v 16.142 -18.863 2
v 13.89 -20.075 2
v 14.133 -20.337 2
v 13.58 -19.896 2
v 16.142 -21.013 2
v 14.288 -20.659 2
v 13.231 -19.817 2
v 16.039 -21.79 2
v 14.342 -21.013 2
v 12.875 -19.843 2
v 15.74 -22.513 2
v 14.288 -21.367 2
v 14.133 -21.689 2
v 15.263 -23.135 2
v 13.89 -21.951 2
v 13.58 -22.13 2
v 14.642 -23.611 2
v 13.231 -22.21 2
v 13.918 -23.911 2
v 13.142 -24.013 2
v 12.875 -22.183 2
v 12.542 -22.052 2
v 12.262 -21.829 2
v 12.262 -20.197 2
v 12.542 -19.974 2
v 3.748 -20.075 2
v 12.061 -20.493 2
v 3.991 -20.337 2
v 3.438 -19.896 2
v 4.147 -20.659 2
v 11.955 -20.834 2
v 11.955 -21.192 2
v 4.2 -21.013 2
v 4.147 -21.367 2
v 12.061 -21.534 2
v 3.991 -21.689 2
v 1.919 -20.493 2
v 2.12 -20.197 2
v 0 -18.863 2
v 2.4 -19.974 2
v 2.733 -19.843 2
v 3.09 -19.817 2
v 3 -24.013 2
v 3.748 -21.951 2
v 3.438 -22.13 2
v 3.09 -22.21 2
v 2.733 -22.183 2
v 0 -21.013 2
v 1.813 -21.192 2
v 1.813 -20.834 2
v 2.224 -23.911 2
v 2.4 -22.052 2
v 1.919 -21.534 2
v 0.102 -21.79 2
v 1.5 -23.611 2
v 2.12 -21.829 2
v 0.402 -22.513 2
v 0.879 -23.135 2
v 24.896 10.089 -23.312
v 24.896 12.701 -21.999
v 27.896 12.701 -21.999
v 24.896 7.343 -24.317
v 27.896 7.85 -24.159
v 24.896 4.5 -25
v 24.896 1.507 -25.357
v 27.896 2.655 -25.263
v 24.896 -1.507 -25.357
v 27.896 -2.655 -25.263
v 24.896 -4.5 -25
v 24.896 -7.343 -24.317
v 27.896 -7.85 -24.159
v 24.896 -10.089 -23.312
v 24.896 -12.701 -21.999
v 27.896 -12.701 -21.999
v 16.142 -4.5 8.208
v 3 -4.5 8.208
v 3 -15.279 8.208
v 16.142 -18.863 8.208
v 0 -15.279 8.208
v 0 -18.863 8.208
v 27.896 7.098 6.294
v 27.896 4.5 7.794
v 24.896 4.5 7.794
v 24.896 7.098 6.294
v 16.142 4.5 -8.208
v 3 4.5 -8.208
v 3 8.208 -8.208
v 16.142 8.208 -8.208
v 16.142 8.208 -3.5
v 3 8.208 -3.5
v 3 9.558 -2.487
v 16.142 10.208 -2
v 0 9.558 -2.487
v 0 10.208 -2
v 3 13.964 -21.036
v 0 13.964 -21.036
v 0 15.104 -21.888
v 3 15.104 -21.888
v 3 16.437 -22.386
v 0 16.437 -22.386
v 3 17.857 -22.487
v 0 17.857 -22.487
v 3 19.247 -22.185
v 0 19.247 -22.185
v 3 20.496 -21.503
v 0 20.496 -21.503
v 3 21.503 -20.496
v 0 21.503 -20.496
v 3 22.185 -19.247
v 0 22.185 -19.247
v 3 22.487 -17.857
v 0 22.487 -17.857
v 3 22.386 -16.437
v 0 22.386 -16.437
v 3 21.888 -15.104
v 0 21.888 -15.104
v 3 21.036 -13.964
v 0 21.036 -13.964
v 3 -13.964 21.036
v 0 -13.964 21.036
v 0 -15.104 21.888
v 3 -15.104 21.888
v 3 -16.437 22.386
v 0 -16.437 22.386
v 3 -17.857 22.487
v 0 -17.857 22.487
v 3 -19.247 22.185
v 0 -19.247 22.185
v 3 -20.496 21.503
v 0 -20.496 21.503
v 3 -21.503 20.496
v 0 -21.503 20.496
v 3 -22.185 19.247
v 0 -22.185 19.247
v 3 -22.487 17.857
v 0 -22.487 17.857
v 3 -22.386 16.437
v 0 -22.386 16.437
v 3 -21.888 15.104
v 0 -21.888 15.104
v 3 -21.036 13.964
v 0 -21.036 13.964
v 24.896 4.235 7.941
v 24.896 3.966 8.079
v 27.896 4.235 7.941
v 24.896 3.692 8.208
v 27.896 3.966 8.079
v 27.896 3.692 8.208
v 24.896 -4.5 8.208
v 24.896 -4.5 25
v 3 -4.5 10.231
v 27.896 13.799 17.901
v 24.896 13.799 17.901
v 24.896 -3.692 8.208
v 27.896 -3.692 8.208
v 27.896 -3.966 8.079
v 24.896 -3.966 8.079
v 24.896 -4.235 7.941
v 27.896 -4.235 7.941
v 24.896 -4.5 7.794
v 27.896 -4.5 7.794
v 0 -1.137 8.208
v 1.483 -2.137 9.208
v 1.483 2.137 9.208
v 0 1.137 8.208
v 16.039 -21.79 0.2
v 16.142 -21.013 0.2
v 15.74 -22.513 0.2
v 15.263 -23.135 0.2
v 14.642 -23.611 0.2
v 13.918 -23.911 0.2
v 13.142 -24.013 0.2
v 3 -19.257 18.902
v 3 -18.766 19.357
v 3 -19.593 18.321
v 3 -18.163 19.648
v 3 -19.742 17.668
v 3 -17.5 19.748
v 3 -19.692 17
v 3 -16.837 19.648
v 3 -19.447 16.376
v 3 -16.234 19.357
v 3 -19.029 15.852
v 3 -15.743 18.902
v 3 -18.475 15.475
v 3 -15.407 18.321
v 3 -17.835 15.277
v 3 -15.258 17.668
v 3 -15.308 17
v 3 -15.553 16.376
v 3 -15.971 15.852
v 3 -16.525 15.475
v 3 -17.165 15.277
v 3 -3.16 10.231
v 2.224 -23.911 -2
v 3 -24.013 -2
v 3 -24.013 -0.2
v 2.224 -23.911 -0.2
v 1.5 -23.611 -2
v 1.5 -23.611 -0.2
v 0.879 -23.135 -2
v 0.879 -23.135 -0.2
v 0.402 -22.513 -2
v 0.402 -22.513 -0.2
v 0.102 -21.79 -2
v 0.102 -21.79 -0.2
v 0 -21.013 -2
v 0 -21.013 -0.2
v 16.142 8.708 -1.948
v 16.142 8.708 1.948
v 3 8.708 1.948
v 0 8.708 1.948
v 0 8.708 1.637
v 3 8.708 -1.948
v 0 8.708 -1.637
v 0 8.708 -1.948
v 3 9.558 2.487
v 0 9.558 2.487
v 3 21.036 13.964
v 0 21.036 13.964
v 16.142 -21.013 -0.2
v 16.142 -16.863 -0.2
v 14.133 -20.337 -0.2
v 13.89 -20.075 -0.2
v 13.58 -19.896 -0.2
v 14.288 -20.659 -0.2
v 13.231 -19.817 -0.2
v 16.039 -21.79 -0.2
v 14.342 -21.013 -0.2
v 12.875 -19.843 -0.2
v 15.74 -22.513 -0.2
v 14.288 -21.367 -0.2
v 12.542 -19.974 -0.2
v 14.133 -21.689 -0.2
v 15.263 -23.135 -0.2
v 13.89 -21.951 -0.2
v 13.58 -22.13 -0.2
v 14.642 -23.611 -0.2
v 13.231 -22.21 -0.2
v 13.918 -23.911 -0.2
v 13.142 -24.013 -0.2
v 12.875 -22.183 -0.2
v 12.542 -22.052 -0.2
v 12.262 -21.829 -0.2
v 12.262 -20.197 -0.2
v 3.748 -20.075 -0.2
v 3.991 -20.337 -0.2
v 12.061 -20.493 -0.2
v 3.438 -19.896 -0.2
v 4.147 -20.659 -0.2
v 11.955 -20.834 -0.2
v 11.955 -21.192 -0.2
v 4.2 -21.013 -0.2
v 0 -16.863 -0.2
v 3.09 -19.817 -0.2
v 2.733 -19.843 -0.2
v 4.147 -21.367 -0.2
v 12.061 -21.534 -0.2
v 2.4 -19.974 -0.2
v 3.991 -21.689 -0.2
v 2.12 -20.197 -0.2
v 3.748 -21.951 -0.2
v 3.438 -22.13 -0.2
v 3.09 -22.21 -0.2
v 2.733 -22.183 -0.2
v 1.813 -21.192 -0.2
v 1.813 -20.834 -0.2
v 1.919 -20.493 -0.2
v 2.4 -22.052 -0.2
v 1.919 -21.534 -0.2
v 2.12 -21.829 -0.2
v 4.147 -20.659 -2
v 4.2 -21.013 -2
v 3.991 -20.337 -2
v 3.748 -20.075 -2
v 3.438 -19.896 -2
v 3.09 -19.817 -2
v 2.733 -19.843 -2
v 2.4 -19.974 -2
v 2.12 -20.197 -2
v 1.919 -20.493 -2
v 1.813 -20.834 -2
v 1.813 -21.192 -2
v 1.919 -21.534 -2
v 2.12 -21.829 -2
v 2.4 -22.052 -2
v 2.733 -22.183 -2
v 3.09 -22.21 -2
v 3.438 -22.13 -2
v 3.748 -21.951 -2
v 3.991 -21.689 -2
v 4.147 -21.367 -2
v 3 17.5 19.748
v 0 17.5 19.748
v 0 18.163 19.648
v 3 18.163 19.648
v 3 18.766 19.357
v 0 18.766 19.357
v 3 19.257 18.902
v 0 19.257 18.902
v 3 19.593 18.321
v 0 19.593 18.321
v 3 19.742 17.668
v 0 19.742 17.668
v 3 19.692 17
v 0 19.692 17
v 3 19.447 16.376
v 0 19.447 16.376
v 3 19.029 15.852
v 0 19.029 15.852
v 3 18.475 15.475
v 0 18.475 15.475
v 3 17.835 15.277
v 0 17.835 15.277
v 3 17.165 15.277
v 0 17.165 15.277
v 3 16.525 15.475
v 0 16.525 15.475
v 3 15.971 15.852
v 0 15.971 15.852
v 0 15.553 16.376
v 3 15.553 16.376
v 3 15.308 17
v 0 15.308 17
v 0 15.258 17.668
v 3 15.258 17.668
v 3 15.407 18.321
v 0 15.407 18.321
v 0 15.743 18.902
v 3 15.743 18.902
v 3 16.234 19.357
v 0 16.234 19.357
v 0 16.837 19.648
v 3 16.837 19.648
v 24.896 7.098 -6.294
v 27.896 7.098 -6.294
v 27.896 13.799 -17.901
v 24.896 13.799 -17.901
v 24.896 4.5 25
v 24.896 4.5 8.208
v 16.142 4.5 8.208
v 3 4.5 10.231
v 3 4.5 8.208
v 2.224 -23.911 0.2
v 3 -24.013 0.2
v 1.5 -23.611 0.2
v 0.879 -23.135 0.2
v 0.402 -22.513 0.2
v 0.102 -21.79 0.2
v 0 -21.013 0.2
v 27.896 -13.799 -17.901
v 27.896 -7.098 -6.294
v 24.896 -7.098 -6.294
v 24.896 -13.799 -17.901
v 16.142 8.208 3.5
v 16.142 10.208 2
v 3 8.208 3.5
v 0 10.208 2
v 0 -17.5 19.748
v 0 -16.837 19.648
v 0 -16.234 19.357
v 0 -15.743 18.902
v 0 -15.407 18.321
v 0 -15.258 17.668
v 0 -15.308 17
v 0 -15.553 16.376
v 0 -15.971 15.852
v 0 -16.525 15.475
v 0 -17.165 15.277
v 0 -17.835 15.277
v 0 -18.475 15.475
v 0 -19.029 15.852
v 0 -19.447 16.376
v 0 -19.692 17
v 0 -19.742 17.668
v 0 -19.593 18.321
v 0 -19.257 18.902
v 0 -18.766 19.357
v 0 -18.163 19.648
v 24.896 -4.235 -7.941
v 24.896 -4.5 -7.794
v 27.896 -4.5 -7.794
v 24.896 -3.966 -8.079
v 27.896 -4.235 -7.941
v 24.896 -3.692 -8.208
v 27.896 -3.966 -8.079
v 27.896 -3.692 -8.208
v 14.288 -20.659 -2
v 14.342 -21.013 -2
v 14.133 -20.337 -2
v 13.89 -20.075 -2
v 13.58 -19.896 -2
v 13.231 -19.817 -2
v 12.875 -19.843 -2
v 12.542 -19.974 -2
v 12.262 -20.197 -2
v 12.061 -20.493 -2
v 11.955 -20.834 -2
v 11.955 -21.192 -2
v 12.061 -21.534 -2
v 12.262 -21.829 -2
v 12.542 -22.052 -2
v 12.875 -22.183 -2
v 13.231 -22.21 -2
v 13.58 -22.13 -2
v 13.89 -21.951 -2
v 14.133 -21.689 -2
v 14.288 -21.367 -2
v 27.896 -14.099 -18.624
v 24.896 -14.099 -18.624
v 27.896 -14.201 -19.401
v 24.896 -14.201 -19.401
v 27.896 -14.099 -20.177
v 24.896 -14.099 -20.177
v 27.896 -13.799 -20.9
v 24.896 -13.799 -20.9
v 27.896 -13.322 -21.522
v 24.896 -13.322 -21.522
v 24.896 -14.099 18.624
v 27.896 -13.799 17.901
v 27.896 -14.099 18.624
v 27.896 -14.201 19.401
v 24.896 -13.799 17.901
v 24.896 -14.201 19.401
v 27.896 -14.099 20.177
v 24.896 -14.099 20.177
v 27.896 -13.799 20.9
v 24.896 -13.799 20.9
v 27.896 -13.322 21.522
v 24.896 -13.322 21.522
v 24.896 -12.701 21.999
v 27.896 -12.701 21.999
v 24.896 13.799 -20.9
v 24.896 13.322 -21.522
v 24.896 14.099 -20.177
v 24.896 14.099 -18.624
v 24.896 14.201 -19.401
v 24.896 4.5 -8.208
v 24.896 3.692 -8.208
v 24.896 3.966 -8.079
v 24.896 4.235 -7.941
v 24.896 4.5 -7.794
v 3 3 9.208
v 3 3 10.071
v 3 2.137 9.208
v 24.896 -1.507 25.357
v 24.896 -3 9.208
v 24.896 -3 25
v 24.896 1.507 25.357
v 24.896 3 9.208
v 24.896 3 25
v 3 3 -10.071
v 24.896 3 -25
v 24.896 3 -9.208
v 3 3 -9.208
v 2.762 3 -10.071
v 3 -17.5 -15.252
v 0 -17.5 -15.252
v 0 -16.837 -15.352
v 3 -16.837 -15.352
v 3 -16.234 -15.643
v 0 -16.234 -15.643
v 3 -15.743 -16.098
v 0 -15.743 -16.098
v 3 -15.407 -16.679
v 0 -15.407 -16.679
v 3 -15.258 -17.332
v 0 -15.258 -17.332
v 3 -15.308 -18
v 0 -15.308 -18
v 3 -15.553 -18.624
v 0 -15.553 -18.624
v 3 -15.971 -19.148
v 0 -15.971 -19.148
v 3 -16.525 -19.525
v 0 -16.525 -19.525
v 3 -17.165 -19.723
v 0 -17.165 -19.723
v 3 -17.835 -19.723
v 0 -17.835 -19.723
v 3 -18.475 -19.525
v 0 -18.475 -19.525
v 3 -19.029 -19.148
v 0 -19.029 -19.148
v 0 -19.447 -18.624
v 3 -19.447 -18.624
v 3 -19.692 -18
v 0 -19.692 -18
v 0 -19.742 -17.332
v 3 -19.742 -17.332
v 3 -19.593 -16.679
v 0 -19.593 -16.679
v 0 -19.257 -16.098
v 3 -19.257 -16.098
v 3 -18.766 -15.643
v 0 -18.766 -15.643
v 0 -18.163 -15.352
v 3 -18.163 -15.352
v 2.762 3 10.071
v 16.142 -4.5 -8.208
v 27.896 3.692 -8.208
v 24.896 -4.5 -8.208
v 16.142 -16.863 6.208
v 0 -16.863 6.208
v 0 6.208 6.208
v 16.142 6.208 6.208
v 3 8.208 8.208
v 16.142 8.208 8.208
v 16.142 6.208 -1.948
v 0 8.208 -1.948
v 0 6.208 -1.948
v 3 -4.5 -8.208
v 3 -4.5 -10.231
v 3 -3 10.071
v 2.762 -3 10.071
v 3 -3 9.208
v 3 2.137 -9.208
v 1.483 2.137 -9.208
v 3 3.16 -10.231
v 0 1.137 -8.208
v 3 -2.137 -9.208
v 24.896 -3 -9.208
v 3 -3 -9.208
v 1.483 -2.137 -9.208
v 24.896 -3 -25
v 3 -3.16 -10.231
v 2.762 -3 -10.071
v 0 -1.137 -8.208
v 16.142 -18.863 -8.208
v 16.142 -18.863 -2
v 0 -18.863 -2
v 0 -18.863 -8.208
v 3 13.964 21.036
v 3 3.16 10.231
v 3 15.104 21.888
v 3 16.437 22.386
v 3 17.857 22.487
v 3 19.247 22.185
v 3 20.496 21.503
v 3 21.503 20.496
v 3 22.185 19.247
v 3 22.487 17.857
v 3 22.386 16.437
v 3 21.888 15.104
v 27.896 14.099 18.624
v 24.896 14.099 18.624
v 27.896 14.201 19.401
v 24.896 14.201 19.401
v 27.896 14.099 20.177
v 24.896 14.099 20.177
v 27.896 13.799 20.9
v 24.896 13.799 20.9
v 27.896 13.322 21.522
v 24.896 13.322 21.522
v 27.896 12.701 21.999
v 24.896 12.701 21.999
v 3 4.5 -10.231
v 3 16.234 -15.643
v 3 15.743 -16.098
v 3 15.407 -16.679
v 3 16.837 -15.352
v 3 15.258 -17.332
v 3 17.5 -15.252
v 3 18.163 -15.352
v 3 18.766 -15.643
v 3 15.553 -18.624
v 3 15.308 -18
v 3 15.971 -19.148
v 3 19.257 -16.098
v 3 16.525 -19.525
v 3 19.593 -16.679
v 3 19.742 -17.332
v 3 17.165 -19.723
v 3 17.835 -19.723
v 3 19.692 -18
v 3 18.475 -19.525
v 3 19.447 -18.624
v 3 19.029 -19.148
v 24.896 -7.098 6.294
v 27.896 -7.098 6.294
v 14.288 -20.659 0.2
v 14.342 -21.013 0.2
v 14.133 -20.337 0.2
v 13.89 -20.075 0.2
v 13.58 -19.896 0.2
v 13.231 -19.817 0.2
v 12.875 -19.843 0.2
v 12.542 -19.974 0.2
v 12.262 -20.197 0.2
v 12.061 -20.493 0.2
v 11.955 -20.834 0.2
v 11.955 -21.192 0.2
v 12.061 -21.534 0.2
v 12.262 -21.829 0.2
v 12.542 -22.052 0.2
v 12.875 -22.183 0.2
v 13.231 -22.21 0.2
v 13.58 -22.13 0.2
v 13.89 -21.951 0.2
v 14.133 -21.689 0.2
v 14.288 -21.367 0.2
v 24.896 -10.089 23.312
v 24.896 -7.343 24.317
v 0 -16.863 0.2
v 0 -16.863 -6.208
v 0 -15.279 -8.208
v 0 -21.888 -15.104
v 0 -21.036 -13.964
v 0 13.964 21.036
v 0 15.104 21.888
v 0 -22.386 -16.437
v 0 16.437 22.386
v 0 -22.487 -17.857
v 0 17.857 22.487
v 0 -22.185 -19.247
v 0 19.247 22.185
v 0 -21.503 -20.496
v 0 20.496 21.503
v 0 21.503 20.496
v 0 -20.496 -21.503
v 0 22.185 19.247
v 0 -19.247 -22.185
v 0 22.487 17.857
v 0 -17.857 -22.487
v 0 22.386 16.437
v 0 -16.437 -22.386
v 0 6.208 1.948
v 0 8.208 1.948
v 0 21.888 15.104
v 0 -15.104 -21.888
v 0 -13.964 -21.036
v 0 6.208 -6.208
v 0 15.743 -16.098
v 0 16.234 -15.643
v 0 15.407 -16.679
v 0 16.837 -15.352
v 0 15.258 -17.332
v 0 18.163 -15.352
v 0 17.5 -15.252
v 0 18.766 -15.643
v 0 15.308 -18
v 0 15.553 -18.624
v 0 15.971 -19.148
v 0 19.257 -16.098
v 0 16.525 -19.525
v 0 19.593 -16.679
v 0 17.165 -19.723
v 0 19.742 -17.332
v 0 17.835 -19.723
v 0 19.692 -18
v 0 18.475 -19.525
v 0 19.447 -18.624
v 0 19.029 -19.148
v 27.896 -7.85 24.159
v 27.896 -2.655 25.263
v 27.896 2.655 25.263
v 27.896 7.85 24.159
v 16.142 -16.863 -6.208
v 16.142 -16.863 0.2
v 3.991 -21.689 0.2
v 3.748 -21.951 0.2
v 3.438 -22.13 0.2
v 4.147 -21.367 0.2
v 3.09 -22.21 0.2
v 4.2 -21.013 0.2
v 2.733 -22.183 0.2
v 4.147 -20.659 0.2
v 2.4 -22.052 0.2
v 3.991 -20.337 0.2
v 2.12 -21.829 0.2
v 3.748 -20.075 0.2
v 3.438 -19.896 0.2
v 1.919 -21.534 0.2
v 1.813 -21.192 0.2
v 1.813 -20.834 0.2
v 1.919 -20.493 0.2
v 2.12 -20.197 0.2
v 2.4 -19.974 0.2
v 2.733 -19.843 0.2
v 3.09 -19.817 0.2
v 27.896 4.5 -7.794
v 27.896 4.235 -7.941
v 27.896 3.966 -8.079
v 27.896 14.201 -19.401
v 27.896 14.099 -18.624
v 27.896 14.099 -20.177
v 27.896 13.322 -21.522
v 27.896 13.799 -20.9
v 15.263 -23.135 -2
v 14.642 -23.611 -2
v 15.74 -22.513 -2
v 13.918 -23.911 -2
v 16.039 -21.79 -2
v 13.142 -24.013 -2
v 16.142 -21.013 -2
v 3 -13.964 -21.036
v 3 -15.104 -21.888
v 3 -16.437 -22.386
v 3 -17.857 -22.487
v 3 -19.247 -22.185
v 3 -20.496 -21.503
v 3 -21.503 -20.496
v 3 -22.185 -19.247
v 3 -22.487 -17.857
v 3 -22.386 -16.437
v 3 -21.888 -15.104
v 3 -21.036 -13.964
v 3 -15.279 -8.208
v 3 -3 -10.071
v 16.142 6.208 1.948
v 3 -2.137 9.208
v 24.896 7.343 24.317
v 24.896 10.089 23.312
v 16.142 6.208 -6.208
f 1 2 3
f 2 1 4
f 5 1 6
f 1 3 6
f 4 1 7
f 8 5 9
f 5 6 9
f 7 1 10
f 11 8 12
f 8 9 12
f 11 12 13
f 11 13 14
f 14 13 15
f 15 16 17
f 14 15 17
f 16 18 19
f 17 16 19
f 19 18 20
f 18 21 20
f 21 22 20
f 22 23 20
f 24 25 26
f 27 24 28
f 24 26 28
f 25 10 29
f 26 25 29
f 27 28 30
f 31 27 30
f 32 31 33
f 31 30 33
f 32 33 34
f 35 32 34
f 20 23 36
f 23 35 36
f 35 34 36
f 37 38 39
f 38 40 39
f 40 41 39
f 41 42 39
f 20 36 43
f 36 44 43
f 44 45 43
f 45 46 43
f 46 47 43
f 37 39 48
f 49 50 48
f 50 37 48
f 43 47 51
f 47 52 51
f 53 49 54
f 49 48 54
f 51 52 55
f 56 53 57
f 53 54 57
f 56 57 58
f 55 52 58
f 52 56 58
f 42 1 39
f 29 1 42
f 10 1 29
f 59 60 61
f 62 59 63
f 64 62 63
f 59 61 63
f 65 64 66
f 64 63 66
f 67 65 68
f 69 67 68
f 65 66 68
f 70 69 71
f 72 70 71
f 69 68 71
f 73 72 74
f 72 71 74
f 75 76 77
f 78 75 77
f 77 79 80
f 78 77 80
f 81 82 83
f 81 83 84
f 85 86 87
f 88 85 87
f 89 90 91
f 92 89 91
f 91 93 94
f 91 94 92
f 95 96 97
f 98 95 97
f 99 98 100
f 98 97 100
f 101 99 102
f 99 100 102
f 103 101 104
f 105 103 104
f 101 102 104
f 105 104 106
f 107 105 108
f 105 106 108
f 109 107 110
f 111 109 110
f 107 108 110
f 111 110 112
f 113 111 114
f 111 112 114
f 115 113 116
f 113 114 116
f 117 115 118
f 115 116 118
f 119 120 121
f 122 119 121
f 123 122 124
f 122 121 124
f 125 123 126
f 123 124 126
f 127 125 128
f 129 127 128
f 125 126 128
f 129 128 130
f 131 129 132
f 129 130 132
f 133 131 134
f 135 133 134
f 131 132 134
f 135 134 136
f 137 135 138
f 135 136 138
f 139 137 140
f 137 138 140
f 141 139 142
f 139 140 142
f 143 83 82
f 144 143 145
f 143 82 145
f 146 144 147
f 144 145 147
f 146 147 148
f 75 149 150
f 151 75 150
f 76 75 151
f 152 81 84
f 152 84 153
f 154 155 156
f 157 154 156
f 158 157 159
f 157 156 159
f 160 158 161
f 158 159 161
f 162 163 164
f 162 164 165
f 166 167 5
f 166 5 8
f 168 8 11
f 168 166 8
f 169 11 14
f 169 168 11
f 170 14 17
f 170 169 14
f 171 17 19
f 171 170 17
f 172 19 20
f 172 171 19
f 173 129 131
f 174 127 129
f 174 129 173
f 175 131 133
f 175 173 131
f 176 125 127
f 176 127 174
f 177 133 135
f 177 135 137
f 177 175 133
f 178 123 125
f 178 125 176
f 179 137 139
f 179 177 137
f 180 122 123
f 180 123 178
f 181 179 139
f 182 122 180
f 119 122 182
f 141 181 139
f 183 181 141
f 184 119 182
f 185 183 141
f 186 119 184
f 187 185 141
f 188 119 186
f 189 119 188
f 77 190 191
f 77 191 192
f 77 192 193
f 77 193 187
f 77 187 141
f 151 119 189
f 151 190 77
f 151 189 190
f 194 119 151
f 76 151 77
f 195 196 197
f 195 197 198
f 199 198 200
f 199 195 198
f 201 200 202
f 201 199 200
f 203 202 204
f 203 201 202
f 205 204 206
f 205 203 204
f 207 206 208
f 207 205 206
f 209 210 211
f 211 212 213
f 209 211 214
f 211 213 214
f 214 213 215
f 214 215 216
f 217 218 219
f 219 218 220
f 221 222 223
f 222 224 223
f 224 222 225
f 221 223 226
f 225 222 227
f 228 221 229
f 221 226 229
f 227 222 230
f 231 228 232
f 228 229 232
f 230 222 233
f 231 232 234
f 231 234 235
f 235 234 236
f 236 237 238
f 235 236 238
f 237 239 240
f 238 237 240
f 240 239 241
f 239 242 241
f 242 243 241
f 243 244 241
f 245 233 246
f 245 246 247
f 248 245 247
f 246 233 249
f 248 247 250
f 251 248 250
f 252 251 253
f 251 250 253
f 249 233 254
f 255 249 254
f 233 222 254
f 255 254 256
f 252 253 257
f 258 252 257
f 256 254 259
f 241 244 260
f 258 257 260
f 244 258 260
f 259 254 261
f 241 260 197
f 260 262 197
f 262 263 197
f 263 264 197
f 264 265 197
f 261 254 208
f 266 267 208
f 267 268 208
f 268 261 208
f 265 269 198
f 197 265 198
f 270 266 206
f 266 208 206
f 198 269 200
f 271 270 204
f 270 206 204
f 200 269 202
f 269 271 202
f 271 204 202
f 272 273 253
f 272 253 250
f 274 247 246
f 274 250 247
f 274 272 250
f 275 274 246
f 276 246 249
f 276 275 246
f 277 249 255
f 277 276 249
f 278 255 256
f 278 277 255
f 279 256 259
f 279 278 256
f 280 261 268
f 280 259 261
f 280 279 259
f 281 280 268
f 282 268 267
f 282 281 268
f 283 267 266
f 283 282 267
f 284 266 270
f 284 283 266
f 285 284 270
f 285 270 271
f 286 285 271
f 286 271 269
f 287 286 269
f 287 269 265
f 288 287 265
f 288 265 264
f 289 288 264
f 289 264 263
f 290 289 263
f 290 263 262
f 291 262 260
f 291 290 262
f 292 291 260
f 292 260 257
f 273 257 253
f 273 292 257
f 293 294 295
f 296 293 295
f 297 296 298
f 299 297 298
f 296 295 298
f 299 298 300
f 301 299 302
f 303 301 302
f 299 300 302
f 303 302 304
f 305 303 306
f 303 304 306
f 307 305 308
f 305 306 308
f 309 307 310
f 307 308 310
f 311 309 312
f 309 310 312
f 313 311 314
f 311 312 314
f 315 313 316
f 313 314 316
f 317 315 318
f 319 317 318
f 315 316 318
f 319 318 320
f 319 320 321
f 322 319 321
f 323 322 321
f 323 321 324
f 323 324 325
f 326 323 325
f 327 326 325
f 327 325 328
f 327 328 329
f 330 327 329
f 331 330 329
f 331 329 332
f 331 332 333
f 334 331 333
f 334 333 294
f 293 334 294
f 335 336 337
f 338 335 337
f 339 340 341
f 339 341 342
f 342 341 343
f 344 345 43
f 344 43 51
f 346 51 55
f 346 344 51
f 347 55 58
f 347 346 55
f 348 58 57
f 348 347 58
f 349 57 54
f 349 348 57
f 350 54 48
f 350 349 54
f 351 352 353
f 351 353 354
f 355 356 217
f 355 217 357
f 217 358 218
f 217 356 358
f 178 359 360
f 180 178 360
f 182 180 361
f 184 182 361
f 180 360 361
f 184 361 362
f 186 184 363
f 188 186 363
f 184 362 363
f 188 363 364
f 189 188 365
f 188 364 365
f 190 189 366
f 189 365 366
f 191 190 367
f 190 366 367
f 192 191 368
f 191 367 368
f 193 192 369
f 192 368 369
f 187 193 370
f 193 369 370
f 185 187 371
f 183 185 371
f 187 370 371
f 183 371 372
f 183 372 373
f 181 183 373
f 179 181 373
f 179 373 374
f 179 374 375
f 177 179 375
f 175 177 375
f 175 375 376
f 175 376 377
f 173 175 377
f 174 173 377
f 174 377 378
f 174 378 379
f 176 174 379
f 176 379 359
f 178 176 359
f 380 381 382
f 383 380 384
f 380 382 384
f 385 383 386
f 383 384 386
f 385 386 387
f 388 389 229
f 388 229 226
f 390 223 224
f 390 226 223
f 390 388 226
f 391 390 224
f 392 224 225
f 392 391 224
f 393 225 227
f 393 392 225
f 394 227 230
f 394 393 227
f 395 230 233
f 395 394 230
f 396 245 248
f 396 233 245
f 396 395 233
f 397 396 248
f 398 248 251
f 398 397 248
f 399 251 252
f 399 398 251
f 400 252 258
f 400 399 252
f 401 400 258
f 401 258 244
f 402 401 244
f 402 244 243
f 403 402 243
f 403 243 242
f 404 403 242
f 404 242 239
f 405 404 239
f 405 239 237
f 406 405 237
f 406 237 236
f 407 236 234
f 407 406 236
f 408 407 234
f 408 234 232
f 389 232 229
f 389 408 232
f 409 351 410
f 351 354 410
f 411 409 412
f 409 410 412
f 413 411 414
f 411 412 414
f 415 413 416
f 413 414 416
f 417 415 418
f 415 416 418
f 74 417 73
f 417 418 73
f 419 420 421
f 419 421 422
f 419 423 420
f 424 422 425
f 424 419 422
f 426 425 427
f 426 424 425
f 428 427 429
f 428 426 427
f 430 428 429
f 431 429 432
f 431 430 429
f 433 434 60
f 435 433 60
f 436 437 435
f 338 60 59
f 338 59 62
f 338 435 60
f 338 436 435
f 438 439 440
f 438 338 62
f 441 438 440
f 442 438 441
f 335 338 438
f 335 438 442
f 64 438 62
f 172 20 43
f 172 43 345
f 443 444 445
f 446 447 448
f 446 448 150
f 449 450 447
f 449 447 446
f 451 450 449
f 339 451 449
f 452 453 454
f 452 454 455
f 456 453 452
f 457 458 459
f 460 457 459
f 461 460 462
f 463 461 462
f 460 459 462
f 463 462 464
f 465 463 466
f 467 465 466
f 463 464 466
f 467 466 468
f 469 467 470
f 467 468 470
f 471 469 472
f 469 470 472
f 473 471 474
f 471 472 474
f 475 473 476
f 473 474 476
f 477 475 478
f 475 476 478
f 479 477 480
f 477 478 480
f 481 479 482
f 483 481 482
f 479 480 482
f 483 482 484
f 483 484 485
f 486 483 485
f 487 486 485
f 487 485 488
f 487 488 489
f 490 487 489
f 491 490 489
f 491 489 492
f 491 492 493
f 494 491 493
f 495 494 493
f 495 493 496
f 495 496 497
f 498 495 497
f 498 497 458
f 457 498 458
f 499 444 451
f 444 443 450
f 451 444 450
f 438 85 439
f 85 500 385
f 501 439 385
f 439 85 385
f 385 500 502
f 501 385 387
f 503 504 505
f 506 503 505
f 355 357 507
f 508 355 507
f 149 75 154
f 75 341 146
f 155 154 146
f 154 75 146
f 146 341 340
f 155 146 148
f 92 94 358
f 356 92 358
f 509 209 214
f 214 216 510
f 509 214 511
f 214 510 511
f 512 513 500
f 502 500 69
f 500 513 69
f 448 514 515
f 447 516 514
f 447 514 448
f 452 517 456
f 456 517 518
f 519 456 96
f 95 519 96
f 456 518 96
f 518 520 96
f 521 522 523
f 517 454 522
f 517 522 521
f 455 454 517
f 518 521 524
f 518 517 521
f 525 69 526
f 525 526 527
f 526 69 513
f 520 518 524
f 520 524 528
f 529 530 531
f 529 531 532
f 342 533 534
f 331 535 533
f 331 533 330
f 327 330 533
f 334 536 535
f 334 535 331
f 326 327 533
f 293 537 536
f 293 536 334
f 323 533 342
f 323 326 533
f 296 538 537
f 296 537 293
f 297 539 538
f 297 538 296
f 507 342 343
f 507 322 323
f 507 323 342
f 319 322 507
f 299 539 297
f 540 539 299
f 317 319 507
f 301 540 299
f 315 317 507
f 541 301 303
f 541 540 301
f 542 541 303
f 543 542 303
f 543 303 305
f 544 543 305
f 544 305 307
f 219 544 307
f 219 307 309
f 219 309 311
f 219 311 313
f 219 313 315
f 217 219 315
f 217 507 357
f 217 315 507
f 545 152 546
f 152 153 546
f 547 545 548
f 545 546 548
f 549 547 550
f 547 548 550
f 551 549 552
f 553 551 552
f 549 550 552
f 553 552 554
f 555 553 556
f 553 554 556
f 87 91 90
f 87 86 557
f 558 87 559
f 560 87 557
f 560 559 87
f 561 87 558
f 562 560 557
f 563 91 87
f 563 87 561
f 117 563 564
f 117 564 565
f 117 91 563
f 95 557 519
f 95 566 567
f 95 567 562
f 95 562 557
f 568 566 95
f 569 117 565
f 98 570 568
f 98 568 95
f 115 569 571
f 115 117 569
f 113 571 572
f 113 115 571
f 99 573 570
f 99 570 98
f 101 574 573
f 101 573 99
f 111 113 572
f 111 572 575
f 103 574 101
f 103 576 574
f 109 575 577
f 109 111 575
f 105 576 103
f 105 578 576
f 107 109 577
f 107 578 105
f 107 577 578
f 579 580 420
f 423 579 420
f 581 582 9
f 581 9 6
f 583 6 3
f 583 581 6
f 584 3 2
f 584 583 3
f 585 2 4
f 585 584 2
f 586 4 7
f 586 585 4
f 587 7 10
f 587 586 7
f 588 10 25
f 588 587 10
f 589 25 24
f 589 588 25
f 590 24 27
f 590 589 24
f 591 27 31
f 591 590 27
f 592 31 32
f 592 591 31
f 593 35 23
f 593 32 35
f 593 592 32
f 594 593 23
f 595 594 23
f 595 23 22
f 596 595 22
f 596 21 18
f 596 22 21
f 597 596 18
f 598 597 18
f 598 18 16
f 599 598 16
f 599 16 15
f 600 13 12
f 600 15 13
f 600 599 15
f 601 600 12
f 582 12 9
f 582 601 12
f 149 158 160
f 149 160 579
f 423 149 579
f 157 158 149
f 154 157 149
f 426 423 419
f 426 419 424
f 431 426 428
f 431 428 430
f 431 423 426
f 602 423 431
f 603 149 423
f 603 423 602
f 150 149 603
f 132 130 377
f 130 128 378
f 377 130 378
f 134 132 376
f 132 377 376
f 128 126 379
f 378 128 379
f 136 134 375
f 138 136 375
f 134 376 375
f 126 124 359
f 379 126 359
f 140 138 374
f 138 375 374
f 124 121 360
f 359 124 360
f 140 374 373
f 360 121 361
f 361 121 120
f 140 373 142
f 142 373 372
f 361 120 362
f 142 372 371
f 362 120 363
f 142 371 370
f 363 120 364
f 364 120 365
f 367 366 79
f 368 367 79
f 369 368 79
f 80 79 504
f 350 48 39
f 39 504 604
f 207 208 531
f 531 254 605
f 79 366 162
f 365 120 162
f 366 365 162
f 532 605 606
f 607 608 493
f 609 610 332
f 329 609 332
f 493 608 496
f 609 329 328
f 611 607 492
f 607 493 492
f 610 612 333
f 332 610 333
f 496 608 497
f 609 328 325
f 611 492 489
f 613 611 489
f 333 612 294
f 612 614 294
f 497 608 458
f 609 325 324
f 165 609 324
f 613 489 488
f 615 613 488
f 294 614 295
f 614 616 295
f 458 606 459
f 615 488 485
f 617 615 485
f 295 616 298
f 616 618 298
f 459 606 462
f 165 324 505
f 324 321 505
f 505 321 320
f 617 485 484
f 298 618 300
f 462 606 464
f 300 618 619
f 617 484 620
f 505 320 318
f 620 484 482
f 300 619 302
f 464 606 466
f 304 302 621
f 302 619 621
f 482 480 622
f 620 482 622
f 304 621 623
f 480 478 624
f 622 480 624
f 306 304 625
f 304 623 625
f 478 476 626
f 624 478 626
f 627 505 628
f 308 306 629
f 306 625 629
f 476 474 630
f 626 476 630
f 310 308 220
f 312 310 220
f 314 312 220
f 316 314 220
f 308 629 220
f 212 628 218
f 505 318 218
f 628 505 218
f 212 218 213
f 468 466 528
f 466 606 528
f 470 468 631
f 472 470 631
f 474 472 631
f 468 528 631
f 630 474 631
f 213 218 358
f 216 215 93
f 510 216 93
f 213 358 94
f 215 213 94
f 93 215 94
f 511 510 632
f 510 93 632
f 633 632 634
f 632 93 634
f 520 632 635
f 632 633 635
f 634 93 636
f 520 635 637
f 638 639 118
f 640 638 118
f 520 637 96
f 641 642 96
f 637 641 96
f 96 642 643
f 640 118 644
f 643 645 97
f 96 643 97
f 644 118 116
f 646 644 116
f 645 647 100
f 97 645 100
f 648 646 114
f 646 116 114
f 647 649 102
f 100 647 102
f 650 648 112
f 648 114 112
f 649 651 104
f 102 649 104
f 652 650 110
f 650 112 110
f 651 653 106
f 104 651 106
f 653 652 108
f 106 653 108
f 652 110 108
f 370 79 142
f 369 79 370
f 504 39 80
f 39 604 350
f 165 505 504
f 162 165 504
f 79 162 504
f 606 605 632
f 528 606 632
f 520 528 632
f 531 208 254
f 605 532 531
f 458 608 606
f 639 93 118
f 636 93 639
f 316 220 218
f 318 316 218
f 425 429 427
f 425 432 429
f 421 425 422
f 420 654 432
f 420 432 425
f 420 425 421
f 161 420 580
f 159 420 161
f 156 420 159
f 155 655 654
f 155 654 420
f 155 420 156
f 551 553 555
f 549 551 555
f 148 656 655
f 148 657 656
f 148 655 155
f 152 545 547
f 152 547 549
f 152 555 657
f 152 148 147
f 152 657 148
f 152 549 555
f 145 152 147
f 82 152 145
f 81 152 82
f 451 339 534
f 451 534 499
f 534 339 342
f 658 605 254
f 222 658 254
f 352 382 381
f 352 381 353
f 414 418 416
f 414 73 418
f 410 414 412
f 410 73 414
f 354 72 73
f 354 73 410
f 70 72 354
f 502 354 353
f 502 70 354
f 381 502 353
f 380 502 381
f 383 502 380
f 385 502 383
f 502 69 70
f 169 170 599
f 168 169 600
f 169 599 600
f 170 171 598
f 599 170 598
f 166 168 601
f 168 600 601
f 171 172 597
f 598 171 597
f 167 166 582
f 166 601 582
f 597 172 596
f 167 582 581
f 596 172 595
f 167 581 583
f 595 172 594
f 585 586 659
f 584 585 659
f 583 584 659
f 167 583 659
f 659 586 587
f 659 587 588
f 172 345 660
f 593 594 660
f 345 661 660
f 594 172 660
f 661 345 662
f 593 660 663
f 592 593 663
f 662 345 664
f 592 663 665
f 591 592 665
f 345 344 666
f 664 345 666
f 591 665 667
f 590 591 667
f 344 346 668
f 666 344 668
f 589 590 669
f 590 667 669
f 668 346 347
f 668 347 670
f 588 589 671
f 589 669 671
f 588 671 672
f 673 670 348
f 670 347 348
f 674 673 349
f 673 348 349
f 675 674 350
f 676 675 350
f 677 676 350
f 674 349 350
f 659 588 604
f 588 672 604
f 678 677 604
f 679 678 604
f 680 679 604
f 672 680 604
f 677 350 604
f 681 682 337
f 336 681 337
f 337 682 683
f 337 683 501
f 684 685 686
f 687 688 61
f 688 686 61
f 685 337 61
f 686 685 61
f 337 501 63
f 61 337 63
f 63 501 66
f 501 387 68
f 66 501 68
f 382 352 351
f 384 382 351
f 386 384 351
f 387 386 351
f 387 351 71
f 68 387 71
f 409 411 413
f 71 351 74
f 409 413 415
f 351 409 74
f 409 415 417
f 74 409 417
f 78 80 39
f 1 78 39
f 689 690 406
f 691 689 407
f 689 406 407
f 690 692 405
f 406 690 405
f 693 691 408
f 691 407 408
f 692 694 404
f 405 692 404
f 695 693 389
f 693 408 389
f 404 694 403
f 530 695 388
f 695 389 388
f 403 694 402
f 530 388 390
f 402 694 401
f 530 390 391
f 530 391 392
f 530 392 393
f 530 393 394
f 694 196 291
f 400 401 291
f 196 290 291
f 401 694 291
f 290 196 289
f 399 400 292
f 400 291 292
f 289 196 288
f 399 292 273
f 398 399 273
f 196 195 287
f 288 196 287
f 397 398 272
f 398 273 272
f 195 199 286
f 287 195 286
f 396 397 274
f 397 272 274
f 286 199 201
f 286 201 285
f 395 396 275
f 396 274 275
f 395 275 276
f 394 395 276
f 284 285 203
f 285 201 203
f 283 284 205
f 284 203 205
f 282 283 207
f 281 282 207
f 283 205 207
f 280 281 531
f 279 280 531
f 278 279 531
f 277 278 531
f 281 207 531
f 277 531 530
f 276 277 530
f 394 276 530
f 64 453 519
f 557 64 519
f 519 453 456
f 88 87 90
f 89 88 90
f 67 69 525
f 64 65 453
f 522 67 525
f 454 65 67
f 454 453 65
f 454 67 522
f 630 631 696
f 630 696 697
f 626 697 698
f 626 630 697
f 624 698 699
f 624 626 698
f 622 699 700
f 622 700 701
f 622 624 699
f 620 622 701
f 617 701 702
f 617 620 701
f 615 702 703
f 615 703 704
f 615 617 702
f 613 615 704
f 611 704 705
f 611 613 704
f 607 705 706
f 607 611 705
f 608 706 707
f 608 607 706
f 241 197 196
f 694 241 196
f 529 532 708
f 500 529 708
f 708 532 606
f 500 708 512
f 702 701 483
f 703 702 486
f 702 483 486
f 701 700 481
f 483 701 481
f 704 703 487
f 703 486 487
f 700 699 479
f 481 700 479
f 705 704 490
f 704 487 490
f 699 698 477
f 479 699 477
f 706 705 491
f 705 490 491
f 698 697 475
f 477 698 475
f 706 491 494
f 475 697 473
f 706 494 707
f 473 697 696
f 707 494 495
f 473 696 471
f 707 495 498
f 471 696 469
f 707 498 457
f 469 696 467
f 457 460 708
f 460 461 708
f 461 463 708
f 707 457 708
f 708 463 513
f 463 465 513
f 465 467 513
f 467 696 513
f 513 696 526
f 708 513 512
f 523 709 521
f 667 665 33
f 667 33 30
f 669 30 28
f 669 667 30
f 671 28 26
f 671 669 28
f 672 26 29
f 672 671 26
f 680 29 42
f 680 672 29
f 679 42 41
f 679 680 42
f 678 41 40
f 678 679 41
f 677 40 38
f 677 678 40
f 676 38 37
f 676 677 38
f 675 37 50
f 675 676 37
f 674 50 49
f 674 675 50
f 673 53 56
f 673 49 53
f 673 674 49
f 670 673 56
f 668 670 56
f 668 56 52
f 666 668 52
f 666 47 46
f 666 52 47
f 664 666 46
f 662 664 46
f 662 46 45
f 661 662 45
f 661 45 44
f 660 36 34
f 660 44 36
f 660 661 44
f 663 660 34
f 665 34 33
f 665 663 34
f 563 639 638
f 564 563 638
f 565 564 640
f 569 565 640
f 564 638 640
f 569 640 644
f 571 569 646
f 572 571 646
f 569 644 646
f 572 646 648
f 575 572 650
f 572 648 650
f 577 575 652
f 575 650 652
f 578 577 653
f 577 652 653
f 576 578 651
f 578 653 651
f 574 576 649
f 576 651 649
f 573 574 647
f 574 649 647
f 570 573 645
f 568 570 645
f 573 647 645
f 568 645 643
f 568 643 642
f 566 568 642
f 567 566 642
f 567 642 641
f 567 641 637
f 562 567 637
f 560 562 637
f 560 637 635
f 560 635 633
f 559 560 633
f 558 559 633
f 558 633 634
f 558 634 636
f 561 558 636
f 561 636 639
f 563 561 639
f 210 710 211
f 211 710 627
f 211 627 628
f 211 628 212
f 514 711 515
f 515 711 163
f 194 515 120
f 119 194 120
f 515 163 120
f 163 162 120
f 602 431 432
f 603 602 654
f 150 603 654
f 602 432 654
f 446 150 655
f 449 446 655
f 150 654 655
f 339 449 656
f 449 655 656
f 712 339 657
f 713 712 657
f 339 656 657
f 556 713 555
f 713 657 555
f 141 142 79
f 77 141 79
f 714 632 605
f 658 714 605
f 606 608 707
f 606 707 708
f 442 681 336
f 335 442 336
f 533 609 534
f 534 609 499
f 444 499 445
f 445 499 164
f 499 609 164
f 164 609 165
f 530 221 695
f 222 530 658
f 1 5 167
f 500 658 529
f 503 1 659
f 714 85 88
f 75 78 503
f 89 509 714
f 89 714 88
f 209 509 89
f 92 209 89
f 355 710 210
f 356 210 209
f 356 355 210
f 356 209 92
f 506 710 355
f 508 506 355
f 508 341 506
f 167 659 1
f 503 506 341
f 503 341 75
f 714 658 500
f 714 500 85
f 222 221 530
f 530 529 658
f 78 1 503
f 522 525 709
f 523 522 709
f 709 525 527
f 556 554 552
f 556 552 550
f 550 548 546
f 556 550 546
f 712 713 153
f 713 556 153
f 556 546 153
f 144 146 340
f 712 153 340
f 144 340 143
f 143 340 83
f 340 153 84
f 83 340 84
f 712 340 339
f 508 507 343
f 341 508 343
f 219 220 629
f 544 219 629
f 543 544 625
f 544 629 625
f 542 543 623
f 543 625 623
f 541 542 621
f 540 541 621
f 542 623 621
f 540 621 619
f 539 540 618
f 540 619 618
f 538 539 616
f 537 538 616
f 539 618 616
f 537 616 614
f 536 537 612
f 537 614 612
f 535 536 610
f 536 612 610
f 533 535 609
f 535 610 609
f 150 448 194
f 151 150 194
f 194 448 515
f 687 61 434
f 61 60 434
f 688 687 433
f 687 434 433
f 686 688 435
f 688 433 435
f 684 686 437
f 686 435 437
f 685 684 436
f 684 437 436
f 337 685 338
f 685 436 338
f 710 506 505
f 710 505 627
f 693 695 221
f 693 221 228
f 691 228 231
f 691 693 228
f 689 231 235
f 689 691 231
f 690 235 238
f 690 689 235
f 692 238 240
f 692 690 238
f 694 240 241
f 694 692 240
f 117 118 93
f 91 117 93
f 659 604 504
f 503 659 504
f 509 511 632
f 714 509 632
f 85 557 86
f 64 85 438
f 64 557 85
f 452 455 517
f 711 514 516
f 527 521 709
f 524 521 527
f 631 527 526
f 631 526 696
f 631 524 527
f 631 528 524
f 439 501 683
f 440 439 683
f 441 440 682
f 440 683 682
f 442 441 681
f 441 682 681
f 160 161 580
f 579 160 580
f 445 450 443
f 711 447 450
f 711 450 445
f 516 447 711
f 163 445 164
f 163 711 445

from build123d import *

# Parameters (mm, degrees)
MICRO_START                                  = -46.670460781
MICRO_SERVO_MOUNT_BASE_PART_CAMERA_TUR_DEPTH = 16.1417
MICRO_START_2                                = 12.849763649
MICRO_SERVO_MOUNT_BASE_PART_CAMERA_3_O_R     = 1.2
MICRO_SERVO_MOUNT_BASE_PART_CAMERA_3_DEPTH   = 16.4158
BOSS_EXTRUDE1_DEPTH                          = 4.5
CUT_EXTRUDE1_DEPTH                           = 3
BOSS_EXTRUDE2_DEPTH                          = 3
BOSS_EXTRUDE3_DEPTH                          = 3
FILLET1_R                                    = 3
BOSS_EXTRUDE4_DEPTH                          = 3
CUT_EXTRUDE2_DEPTH                           = 45.721836893
F_8_CLEARANCE_HOLE1_D                        = 4.4958


with BuildPart() as part:
    # Micro Servo Mount Base Part - Camera Tur: read off the stored shape, not the designer's step
    # Micro Servo Mount Base Part - Camera 2 → Micro Servo Mount Base Part - Camera Tur (new body)
    with BuildSketch(Plane.YZ.offset(MICRO_START)):
        Polygon((-18.758887412, 21.257663649), (-11.608887412, 21.257663649), (-11.608887412, 27.265563649), (11.462212588, 27.265563649), (11.462212588, 23.005463649), (13.962212588, 23.005463649), (13.962212588, 19.109863649), (11.462212588, 19.109863649), (11.462212588, 14.849763649), (-11.608887412, 14.849763649), (-11.608887412, 20.857663649), (-18.758887412, 20.857663649), (-18.758887412, 19.057663649), (-13.608887412, 19.057663649), (-13.608887412, 12.849763649), (13.462212588, 12.849763649), (13.462212588, 17.557663649), (15.462212588, 19.057663649), (15.462212588, 23.057663649), (13.462212588, 24.557663649), (13.462212588, 29.265563649), (-13.608887412, 29.265563649), (-13.608887412, 23.057663649), (-18.758887412, 23.057663649), align=None)
    extrude(amount=MICRO_SERVO_MOUNT_BASE_PART_CAMERA_TUR_DEPTH)

    # Micro Servo Mount Base Part - Camera 3 o → Micro Servo Mount Base Part - Camera 3 (cut)
    with BuildSketch(Plane.XY.offset(MICRO_START_2)):
        with BuildLine():
            Line((-46.670460781, -18.758887412), (-43.670460781, -18.758887412))
            ThreePointArc((-43.670460781, -18.758887412), (-45.791781124, -17.880207755), (-46.670460781, -15.758887412))
            Line((-46.670460781, -15.758887412), (-46.670460781, -18.758887412))
        make_face()
        with BuildLine():
            ThreePointArc((-30.528760781, -15.758887412), (-31.407440438, -17.880207755), (-33.528760781, -18.758887412))
            Line((-33.528760781, -18.758887412), (-30.528760781, -18.758887412))
            Line((-30.528760781, -18.758887412), (-30.528760781, -15.758887412))
        make_face()
        with Locations((-43.670460781, -15.758887412)):
            Circle(MICRO_SERVO_MOUNT_BASE_PART_CAMERA_3_O_R)
        with Locations((-33.528760781, -15.758887412)):
            Circle(MICRO_SERVO_MOUNT_BASE_PART_CAMERA_3_O_R)
    extrude(amount=MICRO_SERVO_MOUNT_BASE_PART_CAMERA_3_DEPTH, mode=Mode.SUBTRACT)


with BuildPart() as part_1:
    # Micro Servo Mount Base Part - Camera 4: read off the stored shape, not the designer's step
    # Micro Servo Mount Base Part - Camera 4: moved
    add(part.part.moved(Location((46.6704608, -5.2543126, -21.0576636))))

    # Sketch7 → Boss-Extrude1 (add, symmetric)
    with BuildSketch(Plane(origin=(0, 0, 0), x_dir=(1, 0, 0), z_dir=(0, 1, 0))):
        Polygon((0, 8.2079), (27.8955, 8.2079), (27.8955, 25), (24.8955, 25), align=None)
        Polygon((24.8955, -25), (0, -8.2079), (27.8955, -8.2079), (27.8955, -25), align=None)
    extrude(amount=BOSS_EXTRUDE1_DEPTH, both=True)

    # Sketch9 → Cut-Extrude1 (cut, symmetric)
    with BuildSketch(Plane(origin=(0, 0, 0), x_dir=(1, 0, 0), z_dir=(0, 1, 0))):
        Polygon((1.482572162, -9.2079), (24.8955, -25), (24.8955, -9.2079), align=None)
        Polygon((24.8955, 9.2079), (1.482572162, 9.2079), (24.8955, 25), align=None)
    extrude(amount=CUT_EXTRUDE1_DEPTH, both=True, mode=Mode.SUBTRACT)

    # Sketch10 → Boss-Extrude2 (add)
    with BuildSketch(Plane(origin=(27.8955, 0, 0), x_dir=(0, 0, -1), z_dir=(1, 0, 0))):
        with BuildLine():
            Line((-21.9985795, 12.700885796), (-7.794228634, 4.5))
            ThreePointArc((-7.794228634, 4.5), (-9, 0), (-7.794228634, -4.5))
            Line((-7.794228634, -4.5), (-21.9985795, -12.700885796))
            ThreePointArc((-21.9985795, -12.700885796), (-25.401771592, 0), (-21.9985795, 12.700885796))
        make_face()
        with BuildLine():
            Line((7.794228634, 4.5), (21.9985795, 12.700885796))
            ThreePointArc((21.9985795, 12.700885796), (25.401771592, 0), (21.9985795, -12.700885796))
            Line((21.9985795, -12.700885796), (7.794228634, -4.5))
            ThreePointArc((7.794228634, -4.5), (9, 0), (7.794228634, 4.5))
        make_face()
    extrude(amount=-BOSS_EXTRUDE2_DEPTH)

    # Sketch11 → Boss-Extrude3 (add)
    with BuildSketch(Plane(origin=(27.8955, 0, 0), x_dir=(0, 0, -1), z_dir=(1, 0, 0))):
        Polygon((-21.9985795, 12.700885796), (-7.794228634, 4.5), (-6.294228634, 7.098076211), (-20.4985795, 15.298962007), align=None)
        Polygon((7.794228634, 4.5), (6.294228634, 7.098076211), (20.4985795, 15.298962007), (21.9985795, 12.700885796), align=None)
        Polygon((21.9985795, -12.700885796), (7.794228634, -4.5), (6.294228634, -7.098076211), (20.4985795, -15.298962007), align=None)
        Polygon((-7.794228634, -4.5), (-6.294228634, -7.098076211), (-20.4985795, -15.298962007), (-21.9985795, -12.700885796), align=None)
    extrude(amount=-BOSS_EXTRUDE3_DEPTH)

    # Fillet1
    fillet1_edges = [part_1.edges().sort_by_distance(p)[0] for p in [
        (26.3955, -15.298962007, -20.4985795),
        (26.3955, -15.298962007, 20.4985795),
        (26.3955, 15.298962007, -20.4985795),
        (26.3955, 15.298962007, 20.4985795),
    ]]
    fillet(fillet1_edges, radius=FILLET1_R - 0.0001)  # a hair under: the kernel refuses the full size

    # Sketch13 → Boss-Extrude4 (add)
    with BuildSketch(Plane.ZY):
        with BuildLine():
            Line((13.964466094, -21.035533906), (8.2079, -15.278967812))
            Line((8.2079, -15.278967812), (8.2079, -1.136832188))
            Line((8.2079, -1.136832188), (21.035533906, -13.964466094))
            ThreePointArc((21.035533906, -13.964466094), (21.035533906, -21.035533906), (13.964466094, -21.035533906))
        make_face()
        with BuildLine():
            Line((-13.964466094, 21.035533906), (-1.136832188, 8.2079))
            Line((-1.136832188, 8.2079), (-8.2079, 8.2079))
            Line((-8.2079, 8.2079), (-8.2079, 1.136832188))
            Line((-8.2079, 1.136832188), (-21.035533906, 13.964466094))
            ThreePointArc((-21.035533906, 13.964466094), (-21.035533906, 21.035533906), (-13.964466094, 21.035533906))
        make_face()
        with BuildLine():
            Line((1.136832188, 8.2079), (13.964466094, 21.035533906))
            ThreePointArc((13.964466094, 21.035533906), (21.035533906, 21.035533906), (21.035533906, 13.964466094))
            Line((21.035533906, 13.964466094), (8.2079, 1.136832188))
            Line((8.2079, 1.136832188), (8.2079, 8.2079))
            Line((8.2079, 8.2079), (1.136832188, 8.2079))
        make_face()
        with BuildLine():
            Line((-8.2079, -1.136832188), (-21.035533906, -13.964466094))
            ThreePointArc((-21.035533906, -13.964466094), (-21.035533906, -21.035533906), (-13.964466094, -21.035533906))
            Line((-13.964466094, -21.035533906), (-8.2079, -15.278967812))
            Line((-8.2079, -15.278967812), (-8.2079, -1.136832188))
        make_face()
    extrude(amount=-BOSS_EXTRUDE4_DEPTH)

    # Sketch14 → Cut-Extrude2 (cut, through all)
    with BuildSketch(Plane.ZY):
        Polygon((-1.9478, 6.2079), (-6.2079, 6.2079), (-6.2079, -16.8632), (6.2079, -16.8632), (6.2079, 6.2079), (1.9478, 6.2079), (1.9478, 8.7079), (-1.9478, 8.7079), align=None)
    extrude(amount=-CUT_EXTRUDE2_DEPTH, mode=Mode.SUBTRACT)

    # #8 Clearance Hole1 (through all)
    with Locations(Plane(origin=(3, 0, 0), x_dir=(0, 0, -1), z_dir=(1, 0, 0))):
        with Locations((-17.5, 17.5), (17.5, 17.5), (17.5, -17.5), (-17.5, -17.5)):
            Hole(F_8_CLEARANCE_HOLE1_D / 2)


solid = part_1.part
